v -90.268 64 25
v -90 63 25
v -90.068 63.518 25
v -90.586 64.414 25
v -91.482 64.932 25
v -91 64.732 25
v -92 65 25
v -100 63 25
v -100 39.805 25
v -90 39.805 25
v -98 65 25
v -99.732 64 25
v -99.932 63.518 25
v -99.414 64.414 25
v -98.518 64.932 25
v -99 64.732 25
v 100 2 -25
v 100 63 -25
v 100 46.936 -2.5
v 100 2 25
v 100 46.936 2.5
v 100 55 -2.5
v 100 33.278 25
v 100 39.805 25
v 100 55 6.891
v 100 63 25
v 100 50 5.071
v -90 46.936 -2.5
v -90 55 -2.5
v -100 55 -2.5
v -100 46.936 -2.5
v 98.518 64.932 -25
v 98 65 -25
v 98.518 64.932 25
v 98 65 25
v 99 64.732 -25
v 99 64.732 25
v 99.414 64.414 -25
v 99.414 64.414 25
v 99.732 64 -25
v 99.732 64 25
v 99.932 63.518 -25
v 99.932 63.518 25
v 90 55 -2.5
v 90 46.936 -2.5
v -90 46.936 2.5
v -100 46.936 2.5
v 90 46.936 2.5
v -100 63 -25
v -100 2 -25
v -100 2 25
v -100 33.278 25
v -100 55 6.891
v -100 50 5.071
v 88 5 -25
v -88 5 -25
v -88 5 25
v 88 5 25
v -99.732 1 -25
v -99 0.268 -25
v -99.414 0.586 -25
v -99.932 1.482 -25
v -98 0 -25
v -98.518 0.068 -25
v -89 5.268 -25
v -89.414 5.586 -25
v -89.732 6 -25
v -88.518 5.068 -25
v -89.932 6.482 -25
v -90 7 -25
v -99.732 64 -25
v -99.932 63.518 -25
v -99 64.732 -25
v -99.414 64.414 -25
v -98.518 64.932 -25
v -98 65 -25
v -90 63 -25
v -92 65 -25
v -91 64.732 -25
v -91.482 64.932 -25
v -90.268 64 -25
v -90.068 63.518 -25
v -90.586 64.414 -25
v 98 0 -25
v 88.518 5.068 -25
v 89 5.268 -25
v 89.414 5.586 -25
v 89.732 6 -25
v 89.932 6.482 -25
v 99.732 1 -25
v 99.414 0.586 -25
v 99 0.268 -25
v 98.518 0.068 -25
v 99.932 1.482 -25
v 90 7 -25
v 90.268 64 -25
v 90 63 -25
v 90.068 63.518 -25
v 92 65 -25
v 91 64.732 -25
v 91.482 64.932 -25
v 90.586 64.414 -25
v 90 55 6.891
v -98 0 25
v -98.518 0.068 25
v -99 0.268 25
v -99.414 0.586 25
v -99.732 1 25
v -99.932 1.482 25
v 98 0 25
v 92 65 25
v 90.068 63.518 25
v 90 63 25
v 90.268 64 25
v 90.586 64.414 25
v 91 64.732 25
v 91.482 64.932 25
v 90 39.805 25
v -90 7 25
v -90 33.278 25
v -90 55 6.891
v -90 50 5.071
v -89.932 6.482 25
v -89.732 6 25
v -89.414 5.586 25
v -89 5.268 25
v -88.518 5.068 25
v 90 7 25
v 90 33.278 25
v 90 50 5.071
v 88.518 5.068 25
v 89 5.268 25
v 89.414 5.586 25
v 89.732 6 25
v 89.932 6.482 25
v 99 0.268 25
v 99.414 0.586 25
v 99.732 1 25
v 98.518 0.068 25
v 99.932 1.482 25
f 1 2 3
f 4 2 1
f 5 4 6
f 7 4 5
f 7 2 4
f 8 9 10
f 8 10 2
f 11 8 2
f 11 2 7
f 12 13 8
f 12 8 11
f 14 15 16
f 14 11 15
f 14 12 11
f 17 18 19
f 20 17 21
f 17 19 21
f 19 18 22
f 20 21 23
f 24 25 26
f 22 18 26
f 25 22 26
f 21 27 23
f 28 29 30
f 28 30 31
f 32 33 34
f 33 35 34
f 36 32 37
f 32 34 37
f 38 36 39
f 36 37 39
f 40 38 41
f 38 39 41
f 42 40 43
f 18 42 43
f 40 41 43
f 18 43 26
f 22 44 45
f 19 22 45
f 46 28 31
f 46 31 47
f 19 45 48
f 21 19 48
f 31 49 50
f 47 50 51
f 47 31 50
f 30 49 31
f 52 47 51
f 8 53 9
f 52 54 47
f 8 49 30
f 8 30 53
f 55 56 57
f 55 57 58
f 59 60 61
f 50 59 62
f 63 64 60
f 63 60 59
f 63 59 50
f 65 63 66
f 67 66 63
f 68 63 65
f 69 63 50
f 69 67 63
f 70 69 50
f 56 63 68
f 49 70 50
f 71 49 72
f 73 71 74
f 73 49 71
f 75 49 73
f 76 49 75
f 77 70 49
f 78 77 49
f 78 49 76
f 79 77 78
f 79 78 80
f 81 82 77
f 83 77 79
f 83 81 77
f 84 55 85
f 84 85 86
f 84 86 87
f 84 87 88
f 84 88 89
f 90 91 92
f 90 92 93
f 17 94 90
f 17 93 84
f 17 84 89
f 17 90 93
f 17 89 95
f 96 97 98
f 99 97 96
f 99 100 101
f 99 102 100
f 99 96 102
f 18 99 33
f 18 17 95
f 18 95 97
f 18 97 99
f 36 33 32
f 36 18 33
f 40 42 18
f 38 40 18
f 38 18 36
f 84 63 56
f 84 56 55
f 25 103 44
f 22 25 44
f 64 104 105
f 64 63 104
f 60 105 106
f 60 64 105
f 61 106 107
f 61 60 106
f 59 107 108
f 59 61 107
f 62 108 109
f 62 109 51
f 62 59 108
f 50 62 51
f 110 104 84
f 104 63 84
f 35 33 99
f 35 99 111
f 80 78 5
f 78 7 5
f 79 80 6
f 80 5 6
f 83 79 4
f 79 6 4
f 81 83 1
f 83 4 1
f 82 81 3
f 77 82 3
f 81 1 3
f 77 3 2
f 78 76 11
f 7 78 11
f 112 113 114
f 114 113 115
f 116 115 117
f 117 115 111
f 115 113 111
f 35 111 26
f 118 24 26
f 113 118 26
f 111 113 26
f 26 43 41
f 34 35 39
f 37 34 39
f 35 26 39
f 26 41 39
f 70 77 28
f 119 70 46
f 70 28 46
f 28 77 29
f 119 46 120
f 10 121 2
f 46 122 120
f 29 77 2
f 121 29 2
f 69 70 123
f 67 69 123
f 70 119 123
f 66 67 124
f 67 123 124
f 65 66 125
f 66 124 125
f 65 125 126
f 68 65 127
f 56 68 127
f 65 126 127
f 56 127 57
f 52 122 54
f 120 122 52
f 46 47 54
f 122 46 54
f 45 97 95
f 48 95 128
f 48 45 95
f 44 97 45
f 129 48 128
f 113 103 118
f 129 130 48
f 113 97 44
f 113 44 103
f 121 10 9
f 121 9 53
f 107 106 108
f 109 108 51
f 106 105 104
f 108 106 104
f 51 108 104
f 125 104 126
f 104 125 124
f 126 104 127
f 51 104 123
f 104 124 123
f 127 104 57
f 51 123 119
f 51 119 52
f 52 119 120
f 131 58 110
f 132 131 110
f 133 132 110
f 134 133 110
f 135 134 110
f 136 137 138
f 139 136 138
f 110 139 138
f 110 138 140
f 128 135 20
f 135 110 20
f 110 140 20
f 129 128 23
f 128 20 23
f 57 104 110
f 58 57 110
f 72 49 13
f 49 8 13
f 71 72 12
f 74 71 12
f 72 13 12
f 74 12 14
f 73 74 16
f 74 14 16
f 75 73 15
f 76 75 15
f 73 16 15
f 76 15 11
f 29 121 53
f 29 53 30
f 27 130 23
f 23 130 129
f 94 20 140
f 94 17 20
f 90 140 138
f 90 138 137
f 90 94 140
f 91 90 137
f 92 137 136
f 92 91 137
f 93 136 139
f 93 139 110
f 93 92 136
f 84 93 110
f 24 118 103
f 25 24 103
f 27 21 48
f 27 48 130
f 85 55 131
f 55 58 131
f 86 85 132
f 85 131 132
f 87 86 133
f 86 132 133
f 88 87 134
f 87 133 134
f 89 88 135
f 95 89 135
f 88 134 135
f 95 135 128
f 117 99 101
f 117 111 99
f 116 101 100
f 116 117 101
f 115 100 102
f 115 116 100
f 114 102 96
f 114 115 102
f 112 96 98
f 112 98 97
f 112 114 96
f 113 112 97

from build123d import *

# Parameters (mm, degrees)
SKETCH1_W           = 200
SKETCH1_H           = 50
BOSS_EXTRUDE1_DEPTH = 5
SKETCH2_W           = 50
SKETCH2_H           = 60
BOSS_EXTRUDE2_DEPTH = 10
CUT_EXTRUDE1_START  = -201
CUT_EXTRUDE1_DEPTH  = 202
FILLET1_R           = 2


with BuildPart() as part:
    # Sketch1 → Boss-Extrude1 (new body)
    with BuildSketch(Plane(origin=(0, 0, 0), x_dir=(1, 0, 0), z_dir=(0, 1, 0))):
        Rectangle(SKETCH1_W, SKETCH1_H)
    extrude(amount=BOSS_EXTRUDE1_DEPTH)

    # Sketch2 → Boss-Extrude2 (add)
    with BuildSketch(Plane.ZY.offset(100)):
        with Locations((0, 35)):
            Rectangle(SKETCH2_W, SKETCH2_H)
    boss_extrude2 = extrude(amount=-BOSS_EXTRUDE2_DEPTH)

    # Sketch3 → Cut-Extrude1 (cut)
    with BuildSketch(Plane.ZY.offset(100).offset(CUT_EXTRUDE1_START)):
        Polygon((25, 39.80474613), (6.89100161, 55), (-2.5, 55), (-2.5, 46.935822228), (2.5, 46.935822228), (5.071150439, 50), (25, 33.277709683), align=None)
    cut_extrude1 = extrude(amount=CUT_EXTRUDE1_DEPTH, mode=Mode.SUBTRACT)

    # Mirror1: Boss-Extrude2, Cut-Extrude1 across plane
    add(boss_extrude2.mirror(Plane(origin=(0, 0, 0), x_dir=(0, 0, 1), z_dir=(1, 0, 0))))
    add(cut_extrude1.mirror(Plane(origin=(0, 0, 0), x_dir=(0, 0, 1), z_dir=(1, 0, 0))), mode=Mode.SUBTRACT)

    # Fillet1
    fillet1_edges = [part.edges().sort_by_distance(p)[0] for p in [
        (-90, 5, 0),
        (-90, 65, 0),
        (-100, 65, 0),
        (100, 0, 0),
        (100, 65, 0),
        (-100, 0, 0),
        (90, 5, 0),
        (90, 65, 0),
    ]]
    fillet(fillet1_edges, radius=FILLET1_R)


solid = part.part
